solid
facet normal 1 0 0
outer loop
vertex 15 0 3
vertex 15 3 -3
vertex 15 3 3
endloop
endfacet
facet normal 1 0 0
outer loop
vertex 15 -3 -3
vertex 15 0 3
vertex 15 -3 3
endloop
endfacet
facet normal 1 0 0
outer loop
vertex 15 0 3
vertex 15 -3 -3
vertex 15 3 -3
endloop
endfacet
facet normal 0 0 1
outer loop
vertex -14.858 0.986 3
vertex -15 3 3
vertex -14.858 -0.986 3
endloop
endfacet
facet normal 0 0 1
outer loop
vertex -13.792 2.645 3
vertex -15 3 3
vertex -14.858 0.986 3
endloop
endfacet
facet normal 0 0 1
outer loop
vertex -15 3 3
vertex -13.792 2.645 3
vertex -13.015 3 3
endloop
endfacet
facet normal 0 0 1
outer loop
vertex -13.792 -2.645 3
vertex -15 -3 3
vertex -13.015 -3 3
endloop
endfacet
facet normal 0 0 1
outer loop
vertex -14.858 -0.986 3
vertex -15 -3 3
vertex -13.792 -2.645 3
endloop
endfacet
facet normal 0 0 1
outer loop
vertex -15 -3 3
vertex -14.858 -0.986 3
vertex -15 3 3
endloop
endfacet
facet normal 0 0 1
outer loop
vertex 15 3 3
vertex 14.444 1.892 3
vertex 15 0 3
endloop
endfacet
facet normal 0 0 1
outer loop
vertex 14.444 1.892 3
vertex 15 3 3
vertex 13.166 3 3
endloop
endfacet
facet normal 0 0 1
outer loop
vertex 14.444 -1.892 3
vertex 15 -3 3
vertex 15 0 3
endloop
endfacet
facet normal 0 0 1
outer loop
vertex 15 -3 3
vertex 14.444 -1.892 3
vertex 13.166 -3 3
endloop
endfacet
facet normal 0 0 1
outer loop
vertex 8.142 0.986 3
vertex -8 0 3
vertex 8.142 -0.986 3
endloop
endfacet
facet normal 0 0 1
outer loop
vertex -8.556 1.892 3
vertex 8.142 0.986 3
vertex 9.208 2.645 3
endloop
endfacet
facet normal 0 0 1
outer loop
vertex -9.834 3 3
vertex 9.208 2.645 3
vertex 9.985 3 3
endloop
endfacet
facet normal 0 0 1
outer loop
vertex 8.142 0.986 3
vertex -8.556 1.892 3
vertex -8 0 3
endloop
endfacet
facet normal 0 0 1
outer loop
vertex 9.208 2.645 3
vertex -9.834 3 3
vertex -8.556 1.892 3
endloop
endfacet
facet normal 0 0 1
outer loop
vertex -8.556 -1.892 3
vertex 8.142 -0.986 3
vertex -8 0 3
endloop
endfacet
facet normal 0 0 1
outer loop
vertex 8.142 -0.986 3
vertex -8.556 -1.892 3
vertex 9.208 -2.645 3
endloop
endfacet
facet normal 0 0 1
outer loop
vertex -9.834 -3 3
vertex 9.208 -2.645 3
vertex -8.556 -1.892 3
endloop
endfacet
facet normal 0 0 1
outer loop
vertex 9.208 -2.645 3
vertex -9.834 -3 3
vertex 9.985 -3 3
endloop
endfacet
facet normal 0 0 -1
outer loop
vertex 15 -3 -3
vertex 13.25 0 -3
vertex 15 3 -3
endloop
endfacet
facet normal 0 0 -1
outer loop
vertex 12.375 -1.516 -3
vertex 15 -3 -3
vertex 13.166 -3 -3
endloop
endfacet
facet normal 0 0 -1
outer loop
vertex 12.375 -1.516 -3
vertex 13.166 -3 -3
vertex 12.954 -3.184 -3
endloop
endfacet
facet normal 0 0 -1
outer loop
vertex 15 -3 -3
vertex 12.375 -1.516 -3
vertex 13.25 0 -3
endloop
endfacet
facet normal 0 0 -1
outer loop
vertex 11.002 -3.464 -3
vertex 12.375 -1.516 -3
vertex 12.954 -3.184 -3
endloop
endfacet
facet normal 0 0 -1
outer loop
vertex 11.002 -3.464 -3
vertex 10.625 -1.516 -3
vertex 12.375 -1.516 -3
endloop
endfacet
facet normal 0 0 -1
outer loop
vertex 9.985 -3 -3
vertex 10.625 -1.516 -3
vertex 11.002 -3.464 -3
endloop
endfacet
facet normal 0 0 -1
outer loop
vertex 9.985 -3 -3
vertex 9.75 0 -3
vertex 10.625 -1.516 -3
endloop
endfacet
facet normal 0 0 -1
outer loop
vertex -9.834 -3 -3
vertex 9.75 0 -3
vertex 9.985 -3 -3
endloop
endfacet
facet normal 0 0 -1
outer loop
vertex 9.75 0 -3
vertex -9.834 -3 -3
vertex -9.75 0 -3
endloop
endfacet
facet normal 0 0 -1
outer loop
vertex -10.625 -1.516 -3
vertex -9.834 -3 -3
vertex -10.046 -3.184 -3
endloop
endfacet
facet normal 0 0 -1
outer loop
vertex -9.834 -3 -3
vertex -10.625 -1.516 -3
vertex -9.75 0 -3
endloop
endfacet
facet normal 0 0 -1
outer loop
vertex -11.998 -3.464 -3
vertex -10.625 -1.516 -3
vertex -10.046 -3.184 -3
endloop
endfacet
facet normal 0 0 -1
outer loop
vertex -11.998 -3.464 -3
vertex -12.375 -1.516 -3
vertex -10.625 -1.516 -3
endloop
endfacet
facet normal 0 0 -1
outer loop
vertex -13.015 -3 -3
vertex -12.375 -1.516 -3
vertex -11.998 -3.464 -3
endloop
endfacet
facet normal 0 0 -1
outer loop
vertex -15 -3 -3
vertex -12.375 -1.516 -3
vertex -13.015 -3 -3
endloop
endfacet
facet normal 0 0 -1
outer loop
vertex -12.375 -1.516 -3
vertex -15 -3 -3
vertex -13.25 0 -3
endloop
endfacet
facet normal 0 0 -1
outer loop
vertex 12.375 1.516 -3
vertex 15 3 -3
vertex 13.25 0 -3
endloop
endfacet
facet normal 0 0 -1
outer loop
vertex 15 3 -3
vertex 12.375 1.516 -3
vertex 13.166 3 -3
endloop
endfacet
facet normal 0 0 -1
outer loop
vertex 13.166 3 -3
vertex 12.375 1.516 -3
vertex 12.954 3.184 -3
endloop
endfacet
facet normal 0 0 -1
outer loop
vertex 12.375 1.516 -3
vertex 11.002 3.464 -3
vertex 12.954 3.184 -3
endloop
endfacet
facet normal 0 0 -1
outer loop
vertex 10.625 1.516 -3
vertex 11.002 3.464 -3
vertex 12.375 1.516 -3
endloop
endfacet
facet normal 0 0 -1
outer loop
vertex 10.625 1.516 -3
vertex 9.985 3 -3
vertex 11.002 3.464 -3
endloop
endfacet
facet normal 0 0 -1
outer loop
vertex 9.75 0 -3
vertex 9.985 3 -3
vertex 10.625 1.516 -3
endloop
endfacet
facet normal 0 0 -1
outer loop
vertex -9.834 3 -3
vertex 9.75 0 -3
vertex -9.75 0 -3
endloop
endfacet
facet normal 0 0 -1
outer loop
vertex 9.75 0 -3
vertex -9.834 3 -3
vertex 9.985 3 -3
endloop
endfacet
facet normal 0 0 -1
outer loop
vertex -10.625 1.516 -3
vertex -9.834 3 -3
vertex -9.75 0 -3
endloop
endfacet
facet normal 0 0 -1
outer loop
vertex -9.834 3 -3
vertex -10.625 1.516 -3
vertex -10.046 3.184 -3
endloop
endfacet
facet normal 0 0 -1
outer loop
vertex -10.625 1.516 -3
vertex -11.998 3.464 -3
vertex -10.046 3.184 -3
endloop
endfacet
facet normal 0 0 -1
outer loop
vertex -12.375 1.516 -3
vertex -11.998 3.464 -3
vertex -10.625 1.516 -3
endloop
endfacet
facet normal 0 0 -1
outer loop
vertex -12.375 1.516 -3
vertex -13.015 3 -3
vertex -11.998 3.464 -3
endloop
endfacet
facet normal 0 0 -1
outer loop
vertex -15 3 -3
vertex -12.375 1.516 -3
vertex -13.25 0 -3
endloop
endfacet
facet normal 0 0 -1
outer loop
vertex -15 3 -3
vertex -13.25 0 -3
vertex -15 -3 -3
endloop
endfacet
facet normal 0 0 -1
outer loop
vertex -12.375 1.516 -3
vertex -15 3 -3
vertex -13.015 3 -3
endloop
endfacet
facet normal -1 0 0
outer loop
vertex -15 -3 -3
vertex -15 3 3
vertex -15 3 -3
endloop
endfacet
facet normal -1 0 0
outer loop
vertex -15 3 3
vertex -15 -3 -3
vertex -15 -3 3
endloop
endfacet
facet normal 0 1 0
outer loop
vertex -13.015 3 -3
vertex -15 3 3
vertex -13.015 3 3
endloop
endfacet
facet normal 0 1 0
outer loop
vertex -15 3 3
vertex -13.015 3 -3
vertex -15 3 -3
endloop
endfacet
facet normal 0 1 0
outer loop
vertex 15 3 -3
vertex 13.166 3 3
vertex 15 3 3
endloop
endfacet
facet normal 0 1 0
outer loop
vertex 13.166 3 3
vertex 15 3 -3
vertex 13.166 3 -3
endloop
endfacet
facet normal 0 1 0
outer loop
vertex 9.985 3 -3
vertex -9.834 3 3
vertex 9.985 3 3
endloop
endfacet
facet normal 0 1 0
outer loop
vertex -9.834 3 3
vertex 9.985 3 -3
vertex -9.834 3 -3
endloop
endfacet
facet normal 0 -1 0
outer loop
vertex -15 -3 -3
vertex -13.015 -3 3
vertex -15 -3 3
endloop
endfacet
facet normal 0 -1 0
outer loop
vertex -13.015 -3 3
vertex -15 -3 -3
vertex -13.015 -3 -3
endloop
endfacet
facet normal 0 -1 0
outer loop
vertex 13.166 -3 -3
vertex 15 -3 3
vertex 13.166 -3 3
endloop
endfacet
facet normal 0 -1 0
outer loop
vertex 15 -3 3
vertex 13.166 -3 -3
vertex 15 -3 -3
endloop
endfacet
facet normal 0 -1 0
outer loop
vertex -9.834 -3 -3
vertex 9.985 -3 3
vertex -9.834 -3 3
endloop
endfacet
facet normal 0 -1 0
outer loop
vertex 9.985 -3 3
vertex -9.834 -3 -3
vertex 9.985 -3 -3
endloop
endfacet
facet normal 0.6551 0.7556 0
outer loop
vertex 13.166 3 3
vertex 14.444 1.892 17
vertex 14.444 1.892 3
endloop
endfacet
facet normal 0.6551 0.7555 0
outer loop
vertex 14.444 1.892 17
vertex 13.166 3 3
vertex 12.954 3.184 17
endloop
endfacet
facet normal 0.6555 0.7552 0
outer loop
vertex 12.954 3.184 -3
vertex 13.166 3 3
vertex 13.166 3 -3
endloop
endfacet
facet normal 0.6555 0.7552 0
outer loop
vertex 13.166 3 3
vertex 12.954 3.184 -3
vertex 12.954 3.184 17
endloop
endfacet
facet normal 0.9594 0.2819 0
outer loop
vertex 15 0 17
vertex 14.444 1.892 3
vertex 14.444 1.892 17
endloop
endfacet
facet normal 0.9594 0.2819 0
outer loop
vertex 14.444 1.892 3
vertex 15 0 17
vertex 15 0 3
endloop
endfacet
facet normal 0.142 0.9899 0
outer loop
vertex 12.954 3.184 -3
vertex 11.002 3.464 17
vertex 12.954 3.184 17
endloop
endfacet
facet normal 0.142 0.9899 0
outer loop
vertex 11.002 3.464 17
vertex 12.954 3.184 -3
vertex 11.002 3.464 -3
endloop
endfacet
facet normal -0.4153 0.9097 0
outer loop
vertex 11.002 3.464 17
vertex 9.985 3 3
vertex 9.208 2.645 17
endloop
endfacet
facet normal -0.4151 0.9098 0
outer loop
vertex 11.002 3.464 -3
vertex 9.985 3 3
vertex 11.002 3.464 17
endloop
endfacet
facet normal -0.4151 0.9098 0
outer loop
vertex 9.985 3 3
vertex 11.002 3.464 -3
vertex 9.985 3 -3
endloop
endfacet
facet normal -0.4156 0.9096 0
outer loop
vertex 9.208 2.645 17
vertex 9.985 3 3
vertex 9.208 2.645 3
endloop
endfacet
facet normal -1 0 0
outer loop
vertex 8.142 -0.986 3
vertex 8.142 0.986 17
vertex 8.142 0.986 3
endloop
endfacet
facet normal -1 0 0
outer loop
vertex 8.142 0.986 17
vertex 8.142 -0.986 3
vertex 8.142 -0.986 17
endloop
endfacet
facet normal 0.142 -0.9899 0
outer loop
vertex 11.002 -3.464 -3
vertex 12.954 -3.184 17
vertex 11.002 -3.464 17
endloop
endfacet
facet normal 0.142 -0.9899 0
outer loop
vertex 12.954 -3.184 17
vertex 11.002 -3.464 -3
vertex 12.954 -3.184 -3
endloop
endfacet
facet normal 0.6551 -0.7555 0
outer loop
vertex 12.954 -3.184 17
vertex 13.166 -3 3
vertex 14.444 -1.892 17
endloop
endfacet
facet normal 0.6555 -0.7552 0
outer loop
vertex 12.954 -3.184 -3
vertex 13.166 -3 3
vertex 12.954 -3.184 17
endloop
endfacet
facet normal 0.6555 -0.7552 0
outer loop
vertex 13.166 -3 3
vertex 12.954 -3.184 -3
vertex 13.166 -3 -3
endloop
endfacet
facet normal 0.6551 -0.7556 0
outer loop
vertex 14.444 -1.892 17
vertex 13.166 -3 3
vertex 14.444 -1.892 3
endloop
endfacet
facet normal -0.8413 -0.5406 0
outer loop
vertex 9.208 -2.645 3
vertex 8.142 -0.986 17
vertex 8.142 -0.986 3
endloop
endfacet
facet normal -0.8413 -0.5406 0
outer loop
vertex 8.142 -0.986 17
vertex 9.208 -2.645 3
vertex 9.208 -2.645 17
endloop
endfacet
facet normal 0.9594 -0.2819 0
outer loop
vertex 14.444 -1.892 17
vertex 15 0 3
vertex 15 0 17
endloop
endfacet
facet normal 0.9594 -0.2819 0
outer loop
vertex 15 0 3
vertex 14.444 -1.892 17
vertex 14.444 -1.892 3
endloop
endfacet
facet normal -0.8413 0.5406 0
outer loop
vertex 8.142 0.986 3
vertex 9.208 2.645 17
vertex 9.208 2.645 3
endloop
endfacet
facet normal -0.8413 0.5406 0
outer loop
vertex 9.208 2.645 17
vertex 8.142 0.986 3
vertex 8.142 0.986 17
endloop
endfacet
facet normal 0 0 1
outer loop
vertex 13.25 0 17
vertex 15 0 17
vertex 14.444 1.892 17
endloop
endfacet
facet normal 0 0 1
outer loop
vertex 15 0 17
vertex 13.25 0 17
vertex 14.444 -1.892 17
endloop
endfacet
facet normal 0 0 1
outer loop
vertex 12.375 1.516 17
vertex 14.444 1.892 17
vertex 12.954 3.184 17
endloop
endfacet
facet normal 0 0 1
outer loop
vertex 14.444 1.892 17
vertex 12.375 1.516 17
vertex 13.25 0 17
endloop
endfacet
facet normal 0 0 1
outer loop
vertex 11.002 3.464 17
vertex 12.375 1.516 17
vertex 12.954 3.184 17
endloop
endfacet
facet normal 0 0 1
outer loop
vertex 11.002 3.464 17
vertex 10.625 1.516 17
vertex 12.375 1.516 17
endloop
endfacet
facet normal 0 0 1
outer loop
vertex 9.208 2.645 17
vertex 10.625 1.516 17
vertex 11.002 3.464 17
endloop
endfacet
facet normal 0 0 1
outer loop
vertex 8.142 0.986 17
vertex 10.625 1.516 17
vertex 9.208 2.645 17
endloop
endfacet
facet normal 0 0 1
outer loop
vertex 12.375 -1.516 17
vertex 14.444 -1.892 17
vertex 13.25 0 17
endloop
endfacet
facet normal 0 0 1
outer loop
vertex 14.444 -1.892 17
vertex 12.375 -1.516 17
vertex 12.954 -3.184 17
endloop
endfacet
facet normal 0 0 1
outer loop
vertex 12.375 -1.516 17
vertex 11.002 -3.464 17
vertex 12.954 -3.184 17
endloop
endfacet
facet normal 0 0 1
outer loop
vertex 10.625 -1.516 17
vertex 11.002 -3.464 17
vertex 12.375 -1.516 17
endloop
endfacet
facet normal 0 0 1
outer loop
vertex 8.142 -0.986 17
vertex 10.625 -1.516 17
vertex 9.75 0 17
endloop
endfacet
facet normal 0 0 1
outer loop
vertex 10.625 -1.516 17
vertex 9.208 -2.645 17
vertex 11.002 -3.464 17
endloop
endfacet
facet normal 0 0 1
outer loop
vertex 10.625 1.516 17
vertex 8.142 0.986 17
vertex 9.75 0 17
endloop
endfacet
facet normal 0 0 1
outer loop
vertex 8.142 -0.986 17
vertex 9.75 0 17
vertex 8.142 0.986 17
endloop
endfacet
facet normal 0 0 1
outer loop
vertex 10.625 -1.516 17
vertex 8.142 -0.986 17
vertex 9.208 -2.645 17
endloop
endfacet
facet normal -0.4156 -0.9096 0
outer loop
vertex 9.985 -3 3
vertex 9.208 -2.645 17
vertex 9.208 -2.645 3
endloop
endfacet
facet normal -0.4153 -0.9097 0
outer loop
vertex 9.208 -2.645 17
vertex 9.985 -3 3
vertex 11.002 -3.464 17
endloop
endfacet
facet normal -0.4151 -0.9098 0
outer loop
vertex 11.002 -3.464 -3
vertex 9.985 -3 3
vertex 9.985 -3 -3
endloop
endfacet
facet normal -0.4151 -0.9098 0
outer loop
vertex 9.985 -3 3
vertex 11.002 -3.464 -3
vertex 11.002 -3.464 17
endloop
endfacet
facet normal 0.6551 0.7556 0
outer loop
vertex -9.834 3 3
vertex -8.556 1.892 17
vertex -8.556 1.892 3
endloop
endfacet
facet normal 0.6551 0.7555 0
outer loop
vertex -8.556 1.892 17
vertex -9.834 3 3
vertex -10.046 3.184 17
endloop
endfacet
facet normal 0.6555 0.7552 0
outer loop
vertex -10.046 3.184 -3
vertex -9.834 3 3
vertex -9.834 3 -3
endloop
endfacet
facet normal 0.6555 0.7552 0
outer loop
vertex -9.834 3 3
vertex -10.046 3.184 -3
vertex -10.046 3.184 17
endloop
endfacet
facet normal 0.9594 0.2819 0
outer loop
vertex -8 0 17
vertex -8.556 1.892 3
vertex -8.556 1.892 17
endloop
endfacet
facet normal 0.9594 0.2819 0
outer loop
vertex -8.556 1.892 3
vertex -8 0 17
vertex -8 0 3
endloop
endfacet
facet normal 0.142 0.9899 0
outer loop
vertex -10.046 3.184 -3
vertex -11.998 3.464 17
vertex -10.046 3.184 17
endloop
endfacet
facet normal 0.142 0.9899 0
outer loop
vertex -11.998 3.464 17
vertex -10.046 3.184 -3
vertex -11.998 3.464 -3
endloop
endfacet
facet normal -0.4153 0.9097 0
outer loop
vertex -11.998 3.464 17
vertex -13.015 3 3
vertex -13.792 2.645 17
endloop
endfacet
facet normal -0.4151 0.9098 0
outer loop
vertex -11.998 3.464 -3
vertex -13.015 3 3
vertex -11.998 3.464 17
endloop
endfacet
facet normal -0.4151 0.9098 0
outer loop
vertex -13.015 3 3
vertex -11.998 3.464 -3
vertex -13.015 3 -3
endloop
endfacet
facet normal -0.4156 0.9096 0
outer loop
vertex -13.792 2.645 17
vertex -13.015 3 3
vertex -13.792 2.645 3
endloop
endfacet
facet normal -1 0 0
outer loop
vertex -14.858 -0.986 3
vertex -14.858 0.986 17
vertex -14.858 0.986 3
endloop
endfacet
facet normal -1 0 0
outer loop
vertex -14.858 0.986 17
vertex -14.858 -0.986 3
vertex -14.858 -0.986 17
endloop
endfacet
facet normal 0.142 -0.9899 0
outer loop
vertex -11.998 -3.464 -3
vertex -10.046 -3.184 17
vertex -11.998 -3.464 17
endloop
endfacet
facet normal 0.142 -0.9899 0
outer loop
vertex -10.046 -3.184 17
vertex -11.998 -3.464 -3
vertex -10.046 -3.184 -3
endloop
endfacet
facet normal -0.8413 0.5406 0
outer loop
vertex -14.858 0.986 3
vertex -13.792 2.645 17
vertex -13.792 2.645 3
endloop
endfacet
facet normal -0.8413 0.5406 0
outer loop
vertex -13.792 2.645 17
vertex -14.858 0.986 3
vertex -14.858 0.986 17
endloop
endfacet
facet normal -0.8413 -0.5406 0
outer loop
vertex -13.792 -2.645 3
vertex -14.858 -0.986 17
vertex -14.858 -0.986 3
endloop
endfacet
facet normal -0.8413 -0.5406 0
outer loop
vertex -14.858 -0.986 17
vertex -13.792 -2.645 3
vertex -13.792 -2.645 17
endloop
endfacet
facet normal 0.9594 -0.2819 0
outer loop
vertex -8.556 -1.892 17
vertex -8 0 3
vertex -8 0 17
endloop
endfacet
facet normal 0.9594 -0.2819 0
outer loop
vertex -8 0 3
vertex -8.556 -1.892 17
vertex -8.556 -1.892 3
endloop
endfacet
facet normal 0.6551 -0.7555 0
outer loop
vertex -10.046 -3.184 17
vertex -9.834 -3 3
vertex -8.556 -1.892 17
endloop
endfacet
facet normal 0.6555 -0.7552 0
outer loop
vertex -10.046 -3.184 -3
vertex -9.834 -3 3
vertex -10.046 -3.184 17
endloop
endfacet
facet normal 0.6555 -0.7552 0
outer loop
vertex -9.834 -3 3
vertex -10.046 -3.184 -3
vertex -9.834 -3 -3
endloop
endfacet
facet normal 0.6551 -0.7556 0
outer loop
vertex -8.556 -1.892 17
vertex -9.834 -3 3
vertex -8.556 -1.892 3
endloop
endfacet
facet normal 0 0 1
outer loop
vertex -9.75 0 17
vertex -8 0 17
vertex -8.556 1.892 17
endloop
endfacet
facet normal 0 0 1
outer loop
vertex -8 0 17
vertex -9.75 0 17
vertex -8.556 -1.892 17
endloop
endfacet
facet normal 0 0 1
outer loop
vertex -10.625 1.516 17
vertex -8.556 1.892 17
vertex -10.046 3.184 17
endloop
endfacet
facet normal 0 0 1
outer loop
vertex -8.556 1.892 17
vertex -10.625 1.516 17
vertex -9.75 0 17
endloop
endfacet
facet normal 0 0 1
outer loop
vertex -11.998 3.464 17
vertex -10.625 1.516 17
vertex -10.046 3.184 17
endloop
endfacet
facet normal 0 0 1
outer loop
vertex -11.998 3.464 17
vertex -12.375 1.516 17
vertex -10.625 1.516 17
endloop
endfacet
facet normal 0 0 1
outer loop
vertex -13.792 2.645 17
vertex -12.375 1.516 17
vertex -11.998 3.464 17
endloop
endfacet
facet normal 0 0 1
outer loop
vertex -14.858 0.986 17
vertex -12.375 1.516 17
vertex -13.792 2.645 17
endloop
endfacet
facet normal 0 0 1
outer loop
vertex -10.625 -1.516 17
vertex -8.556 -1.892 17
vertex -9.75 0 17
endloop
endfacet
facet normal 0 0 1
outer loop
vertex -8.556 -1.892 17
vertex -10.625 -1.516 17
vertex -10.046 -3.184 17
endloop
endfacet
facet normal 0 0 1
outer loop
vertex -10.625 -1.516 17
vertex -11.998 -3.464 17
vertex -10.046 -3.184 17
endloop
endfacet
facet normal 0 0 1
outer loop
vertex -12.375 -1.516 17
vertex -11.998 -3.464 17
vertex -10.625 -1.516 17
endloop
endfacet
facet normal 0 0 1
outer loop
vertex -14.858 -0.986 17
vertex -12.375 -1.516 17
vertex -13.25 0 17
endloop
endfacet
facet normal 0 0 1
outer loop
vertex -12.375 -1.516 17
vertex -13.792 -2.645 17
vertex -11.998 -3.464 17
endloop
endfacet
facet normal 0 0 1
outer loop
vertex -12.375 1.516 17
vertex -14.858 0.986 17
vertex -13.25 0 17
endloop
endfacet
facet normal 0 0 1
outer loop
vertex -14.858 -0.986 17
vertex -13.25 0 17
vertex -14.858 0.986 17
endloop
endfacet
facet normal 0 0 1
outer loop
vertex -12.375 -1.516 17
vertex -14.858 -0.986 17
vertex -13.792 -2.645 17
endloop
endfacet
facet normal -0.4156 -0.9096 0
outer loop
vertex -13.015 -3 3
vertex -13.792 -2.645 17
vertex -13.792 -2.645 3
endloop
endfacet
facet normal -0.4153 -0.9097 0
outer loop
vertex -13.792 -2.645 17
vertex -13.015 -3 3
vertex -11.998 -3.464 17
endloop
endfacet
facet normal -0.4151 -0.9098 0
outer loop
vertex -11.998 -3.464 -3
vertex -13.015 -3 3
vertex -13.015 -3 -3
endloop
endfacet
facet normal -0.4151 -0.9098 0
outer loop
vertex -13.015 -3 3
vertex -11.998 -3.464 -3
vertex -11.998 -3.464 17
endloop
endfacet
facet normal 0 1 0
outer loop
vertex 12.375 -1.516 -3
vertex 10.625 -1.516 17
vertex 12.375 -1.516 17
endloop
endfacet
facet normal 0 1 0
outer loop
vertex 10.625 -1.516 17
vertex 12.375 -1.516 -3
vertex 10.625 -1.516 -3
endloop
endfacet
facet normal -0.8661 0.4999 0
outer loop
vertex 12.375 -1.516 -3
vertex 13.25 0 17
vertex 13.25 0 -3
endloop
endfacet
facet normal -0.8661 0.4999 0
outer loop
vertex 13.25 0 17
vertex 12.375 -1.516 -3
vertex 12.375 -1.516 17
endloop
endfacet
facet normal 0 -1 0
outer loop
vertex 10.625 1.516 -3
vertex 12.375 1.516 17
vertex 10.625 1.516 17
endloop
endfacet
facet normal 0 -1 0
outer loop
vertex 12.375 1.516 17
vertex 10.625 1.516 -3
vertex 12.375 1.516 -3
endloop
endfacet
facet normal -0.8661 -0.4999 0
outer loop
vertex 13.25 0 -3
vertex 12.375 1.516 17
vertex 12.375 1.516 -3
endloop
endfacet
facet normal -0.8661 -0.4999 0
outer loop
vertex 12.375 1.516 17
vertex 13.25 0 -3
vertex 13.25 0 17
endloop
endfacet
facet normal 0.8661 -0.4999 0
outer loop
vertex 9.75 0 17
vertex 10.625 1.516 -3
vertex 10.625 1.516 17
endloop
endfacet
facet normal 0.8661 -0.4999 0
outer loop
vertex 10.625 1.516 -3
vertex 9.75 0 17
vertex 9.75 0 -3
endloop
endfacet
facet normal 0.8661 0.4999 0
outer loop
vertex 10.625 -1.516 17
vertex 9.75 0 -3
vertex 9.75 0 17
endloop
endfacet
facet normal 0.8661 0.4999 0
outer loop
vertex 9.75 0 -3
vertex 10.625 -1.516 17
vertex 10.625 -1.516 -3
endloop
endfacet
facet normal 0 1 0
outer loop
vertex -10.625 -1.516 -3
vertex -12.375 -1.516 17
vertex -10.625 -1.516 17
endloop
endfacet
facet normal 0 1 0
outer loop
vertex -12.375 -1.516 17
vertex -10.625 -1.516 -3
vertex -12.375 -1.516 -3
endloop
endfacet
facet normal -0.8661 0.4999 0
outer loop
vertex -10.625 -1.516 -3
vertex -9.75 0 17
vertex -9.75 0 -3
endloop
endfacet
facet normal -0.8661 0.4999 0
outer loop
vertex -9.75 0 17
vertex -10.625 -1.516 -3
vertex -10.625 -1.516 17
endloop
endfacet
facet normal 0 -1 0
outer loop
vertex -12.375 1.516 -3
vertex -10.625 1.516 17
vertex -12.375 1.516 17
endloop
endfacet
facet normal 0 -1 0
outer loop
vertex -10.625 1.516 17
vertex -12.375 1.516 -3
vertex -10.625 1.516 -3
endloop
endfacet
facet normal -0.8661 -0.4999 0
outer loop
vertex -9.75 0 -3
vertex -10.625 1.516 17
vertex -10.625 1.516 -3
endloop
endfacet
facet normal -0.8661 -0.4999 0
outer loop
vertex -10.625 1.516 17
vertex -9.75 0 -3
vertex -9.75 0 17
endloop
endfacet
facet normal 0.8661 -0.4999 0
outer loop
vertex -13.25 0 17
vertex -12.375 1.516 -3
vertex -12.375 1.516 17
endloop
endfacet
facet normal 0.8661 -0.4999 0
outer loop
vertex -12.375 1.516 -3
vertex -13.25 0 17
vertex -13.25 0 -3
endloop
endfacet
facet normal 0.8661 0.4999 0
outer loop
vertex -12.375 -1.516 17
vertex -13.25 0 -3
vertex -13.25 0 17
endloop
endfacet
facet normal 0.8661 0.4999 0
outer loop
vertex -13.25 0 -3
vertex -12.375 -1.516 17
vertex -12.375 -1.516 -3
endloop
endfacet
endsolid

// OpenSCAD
//vent settings
	//options are
		//left_side
		//right_side
		//top_side
		//back_side
vent								= "left_side";

//door settings
door_width					= 200;
door_height				= 150;

//handle settings
handle_height			= 30;
handle_width				= 6;

//other settings
air_vent_diamiter		=	20;
box_height					= 200;
box_width					= 300;
box_depth					= 400;
power_hole_diamiter= 7;

//screw settings
head_depth				= 2;
head_diamiter			= 6;
screw_size					= 3.5;

//corner settings
wall_thickness			= 5;
corner_size				= 30;

//hindge settings
extra_gap					= .25;
thickness					= 3;
hindge_height			= 30;
//hindge
//corner
//cut_files
//handle
render = "handle";

//if you choose cut_files you can choose what side if you want
side	=	"all";
	//options are
		//all
		//left_side
		//right_side
		//top_side
		//back_side
		//front_side
		//bottom_side

// modules
if (render == "corner"){
	corner();
} else if (render == "hindge"){
	hindge();
} else if (render == "cut_files"){
	single_side();
} else if (render == "handle"){
	handle();
}

module screws(){
	translate([wall_thickness*2,0,wall_thickness*2])  rotate([90,0,0]) cylinder(h=10, d=screw_size, center=true);
	translate([wall_thickness*5,0,wall_thickness*5])  rotate([90,0,0]) cylinder(h=10, d=screw_size, center=true);
	translate([wall_thickness*2,0,wall_thickness*2])  rotate([90,0,0]) cylinder(h=head_depth*2, d=head_diamiter, center=true);
	translate([wall_thickness*5,0,wall_thickness*5])  rotate([90,0,0]) cylinder(h=head_depth*2, d=head_diamiter, center=true);
}
module corner(){
	difference(){
		cube([wall_thickness*6,wall_thickness*6,wall_thickness*6]);
		translate([wall_thickness,wall_thickness,wall_thickness]) cube([100,100,100]);
		screws();
		rotate([0,0,90]) screws();
		#rotate([90,0,90]) screws(head_diamiter=3);
	}
}

module handle(){
	difference(){
		union(){
			cube([handle_height,handle_width,6], center=true);
			translate([handle_height/2-screw_size,0,-3]) cylinder(r=screw_size, h=20);
			translate([-handle_height/2+screw_size,0,-3]) cylinder(r=screw_size, h=20);
		}
		translate([handle_height/2-screw_size,0,-3]) cylinder(d=screw_size, h=20);
		translate([-handle_height/2+screw_size,0,-3]) cylinder(d=screw_size, h=20);
	}
}

module hindge(){
	difference(){
		intersection(){
			cube([hindge_height,20,screw_size+thickness*2]);
			union(){
				rotate([0,90,0]) translate([-screw_size*1.25,screw_size*1.25,0]) cylinder(d=screw_size+thickness, h=hindge_height, $fn=50);
				translate([0,screw_size*.25,0]) cube([hindge_height,20,screw_size]);
			}
		}
		rotate([0,90,0]) translate([-screw_size*1.25,screw_size*1.25,0]) cylinder(d=screw_size, h=hindge_height);
		for ( i = [-1 : 5] ){
			translate([i*10,0,0]) cube([5+extra_gap,screw_size+thickness+1.5,50]);
			translate([i*10,0,screw_size]) rotate([-90,0,0]) screws(wall_thickness=7);
		}
	}
}

module left_side(){
	difference(){
		square([box_depth,box_height]);
		if (vent == "left_side"){
			translate([box_depth/2,box_height/2]) circle(d=air_vent_diamiter);
		}
	}
}

module right_side(){
	difference(){
		square([box_depth,box_height]);
		if (vent == "right_side"){
			translate([box_depth/2,box_height/2]) circle(d=air_vent_diamiter);
		}
	}
}

module back_side(){
	difference(){
		square([box_width,box_height]);
		if (vent == "back_side"){
			translate([box_width/2,box_height/2]) circle(d=air_vent_diamiter);
		}
		translate([power_hole_diamiter*2,power_hole_diamiter*2]) circle(d=power_hole_diamiter);
	}
}

module bottom_side(){
	square([box_width,box_depth]);
}

module top_side(){
	difference(){
		square([box_width,box_depth]);
		if (vent == "top_side"){
			translate([box_width/2,box_depth/2]) circle(d=air_vent_diamiter);
		}
	}
}

module front_side(){
	difference(){
		square([box_width,box_height], center=true);
		square([door_width,door_height], center=true);
	}
	translate([door_width/2-5,handle_height/2]) circle(d=screw_size);
	translate([door_width/2-5,-handle_height/2]) circle(d=screw_size);
}

module single_side(){
	if (side == "left_side"){
		left_side();
	} else if (side == "right_side"){
		right_side();
	} else if (side == "top_side"){
		top_side();
	} else if (side == "bottom_side"){
		bottom_side();
	} else if (side == "front_side"){
		front_side();
	} else if (side == "back_side"){
		back_side();
	} else{
		sides();
	}
}

module sides(){
	translate([-box_depth-1,0]) left_side();
	translate([1,0]) right_side();
	translate([1,box_height+1]) top_side();
	translate([-box_width-1,-box_depth-1]) bottom_side();
	translate([box_width/2+1,-box_height/2-1]) front_side();
	translate([-box_width-1,box_height+1]) back_side();
}
